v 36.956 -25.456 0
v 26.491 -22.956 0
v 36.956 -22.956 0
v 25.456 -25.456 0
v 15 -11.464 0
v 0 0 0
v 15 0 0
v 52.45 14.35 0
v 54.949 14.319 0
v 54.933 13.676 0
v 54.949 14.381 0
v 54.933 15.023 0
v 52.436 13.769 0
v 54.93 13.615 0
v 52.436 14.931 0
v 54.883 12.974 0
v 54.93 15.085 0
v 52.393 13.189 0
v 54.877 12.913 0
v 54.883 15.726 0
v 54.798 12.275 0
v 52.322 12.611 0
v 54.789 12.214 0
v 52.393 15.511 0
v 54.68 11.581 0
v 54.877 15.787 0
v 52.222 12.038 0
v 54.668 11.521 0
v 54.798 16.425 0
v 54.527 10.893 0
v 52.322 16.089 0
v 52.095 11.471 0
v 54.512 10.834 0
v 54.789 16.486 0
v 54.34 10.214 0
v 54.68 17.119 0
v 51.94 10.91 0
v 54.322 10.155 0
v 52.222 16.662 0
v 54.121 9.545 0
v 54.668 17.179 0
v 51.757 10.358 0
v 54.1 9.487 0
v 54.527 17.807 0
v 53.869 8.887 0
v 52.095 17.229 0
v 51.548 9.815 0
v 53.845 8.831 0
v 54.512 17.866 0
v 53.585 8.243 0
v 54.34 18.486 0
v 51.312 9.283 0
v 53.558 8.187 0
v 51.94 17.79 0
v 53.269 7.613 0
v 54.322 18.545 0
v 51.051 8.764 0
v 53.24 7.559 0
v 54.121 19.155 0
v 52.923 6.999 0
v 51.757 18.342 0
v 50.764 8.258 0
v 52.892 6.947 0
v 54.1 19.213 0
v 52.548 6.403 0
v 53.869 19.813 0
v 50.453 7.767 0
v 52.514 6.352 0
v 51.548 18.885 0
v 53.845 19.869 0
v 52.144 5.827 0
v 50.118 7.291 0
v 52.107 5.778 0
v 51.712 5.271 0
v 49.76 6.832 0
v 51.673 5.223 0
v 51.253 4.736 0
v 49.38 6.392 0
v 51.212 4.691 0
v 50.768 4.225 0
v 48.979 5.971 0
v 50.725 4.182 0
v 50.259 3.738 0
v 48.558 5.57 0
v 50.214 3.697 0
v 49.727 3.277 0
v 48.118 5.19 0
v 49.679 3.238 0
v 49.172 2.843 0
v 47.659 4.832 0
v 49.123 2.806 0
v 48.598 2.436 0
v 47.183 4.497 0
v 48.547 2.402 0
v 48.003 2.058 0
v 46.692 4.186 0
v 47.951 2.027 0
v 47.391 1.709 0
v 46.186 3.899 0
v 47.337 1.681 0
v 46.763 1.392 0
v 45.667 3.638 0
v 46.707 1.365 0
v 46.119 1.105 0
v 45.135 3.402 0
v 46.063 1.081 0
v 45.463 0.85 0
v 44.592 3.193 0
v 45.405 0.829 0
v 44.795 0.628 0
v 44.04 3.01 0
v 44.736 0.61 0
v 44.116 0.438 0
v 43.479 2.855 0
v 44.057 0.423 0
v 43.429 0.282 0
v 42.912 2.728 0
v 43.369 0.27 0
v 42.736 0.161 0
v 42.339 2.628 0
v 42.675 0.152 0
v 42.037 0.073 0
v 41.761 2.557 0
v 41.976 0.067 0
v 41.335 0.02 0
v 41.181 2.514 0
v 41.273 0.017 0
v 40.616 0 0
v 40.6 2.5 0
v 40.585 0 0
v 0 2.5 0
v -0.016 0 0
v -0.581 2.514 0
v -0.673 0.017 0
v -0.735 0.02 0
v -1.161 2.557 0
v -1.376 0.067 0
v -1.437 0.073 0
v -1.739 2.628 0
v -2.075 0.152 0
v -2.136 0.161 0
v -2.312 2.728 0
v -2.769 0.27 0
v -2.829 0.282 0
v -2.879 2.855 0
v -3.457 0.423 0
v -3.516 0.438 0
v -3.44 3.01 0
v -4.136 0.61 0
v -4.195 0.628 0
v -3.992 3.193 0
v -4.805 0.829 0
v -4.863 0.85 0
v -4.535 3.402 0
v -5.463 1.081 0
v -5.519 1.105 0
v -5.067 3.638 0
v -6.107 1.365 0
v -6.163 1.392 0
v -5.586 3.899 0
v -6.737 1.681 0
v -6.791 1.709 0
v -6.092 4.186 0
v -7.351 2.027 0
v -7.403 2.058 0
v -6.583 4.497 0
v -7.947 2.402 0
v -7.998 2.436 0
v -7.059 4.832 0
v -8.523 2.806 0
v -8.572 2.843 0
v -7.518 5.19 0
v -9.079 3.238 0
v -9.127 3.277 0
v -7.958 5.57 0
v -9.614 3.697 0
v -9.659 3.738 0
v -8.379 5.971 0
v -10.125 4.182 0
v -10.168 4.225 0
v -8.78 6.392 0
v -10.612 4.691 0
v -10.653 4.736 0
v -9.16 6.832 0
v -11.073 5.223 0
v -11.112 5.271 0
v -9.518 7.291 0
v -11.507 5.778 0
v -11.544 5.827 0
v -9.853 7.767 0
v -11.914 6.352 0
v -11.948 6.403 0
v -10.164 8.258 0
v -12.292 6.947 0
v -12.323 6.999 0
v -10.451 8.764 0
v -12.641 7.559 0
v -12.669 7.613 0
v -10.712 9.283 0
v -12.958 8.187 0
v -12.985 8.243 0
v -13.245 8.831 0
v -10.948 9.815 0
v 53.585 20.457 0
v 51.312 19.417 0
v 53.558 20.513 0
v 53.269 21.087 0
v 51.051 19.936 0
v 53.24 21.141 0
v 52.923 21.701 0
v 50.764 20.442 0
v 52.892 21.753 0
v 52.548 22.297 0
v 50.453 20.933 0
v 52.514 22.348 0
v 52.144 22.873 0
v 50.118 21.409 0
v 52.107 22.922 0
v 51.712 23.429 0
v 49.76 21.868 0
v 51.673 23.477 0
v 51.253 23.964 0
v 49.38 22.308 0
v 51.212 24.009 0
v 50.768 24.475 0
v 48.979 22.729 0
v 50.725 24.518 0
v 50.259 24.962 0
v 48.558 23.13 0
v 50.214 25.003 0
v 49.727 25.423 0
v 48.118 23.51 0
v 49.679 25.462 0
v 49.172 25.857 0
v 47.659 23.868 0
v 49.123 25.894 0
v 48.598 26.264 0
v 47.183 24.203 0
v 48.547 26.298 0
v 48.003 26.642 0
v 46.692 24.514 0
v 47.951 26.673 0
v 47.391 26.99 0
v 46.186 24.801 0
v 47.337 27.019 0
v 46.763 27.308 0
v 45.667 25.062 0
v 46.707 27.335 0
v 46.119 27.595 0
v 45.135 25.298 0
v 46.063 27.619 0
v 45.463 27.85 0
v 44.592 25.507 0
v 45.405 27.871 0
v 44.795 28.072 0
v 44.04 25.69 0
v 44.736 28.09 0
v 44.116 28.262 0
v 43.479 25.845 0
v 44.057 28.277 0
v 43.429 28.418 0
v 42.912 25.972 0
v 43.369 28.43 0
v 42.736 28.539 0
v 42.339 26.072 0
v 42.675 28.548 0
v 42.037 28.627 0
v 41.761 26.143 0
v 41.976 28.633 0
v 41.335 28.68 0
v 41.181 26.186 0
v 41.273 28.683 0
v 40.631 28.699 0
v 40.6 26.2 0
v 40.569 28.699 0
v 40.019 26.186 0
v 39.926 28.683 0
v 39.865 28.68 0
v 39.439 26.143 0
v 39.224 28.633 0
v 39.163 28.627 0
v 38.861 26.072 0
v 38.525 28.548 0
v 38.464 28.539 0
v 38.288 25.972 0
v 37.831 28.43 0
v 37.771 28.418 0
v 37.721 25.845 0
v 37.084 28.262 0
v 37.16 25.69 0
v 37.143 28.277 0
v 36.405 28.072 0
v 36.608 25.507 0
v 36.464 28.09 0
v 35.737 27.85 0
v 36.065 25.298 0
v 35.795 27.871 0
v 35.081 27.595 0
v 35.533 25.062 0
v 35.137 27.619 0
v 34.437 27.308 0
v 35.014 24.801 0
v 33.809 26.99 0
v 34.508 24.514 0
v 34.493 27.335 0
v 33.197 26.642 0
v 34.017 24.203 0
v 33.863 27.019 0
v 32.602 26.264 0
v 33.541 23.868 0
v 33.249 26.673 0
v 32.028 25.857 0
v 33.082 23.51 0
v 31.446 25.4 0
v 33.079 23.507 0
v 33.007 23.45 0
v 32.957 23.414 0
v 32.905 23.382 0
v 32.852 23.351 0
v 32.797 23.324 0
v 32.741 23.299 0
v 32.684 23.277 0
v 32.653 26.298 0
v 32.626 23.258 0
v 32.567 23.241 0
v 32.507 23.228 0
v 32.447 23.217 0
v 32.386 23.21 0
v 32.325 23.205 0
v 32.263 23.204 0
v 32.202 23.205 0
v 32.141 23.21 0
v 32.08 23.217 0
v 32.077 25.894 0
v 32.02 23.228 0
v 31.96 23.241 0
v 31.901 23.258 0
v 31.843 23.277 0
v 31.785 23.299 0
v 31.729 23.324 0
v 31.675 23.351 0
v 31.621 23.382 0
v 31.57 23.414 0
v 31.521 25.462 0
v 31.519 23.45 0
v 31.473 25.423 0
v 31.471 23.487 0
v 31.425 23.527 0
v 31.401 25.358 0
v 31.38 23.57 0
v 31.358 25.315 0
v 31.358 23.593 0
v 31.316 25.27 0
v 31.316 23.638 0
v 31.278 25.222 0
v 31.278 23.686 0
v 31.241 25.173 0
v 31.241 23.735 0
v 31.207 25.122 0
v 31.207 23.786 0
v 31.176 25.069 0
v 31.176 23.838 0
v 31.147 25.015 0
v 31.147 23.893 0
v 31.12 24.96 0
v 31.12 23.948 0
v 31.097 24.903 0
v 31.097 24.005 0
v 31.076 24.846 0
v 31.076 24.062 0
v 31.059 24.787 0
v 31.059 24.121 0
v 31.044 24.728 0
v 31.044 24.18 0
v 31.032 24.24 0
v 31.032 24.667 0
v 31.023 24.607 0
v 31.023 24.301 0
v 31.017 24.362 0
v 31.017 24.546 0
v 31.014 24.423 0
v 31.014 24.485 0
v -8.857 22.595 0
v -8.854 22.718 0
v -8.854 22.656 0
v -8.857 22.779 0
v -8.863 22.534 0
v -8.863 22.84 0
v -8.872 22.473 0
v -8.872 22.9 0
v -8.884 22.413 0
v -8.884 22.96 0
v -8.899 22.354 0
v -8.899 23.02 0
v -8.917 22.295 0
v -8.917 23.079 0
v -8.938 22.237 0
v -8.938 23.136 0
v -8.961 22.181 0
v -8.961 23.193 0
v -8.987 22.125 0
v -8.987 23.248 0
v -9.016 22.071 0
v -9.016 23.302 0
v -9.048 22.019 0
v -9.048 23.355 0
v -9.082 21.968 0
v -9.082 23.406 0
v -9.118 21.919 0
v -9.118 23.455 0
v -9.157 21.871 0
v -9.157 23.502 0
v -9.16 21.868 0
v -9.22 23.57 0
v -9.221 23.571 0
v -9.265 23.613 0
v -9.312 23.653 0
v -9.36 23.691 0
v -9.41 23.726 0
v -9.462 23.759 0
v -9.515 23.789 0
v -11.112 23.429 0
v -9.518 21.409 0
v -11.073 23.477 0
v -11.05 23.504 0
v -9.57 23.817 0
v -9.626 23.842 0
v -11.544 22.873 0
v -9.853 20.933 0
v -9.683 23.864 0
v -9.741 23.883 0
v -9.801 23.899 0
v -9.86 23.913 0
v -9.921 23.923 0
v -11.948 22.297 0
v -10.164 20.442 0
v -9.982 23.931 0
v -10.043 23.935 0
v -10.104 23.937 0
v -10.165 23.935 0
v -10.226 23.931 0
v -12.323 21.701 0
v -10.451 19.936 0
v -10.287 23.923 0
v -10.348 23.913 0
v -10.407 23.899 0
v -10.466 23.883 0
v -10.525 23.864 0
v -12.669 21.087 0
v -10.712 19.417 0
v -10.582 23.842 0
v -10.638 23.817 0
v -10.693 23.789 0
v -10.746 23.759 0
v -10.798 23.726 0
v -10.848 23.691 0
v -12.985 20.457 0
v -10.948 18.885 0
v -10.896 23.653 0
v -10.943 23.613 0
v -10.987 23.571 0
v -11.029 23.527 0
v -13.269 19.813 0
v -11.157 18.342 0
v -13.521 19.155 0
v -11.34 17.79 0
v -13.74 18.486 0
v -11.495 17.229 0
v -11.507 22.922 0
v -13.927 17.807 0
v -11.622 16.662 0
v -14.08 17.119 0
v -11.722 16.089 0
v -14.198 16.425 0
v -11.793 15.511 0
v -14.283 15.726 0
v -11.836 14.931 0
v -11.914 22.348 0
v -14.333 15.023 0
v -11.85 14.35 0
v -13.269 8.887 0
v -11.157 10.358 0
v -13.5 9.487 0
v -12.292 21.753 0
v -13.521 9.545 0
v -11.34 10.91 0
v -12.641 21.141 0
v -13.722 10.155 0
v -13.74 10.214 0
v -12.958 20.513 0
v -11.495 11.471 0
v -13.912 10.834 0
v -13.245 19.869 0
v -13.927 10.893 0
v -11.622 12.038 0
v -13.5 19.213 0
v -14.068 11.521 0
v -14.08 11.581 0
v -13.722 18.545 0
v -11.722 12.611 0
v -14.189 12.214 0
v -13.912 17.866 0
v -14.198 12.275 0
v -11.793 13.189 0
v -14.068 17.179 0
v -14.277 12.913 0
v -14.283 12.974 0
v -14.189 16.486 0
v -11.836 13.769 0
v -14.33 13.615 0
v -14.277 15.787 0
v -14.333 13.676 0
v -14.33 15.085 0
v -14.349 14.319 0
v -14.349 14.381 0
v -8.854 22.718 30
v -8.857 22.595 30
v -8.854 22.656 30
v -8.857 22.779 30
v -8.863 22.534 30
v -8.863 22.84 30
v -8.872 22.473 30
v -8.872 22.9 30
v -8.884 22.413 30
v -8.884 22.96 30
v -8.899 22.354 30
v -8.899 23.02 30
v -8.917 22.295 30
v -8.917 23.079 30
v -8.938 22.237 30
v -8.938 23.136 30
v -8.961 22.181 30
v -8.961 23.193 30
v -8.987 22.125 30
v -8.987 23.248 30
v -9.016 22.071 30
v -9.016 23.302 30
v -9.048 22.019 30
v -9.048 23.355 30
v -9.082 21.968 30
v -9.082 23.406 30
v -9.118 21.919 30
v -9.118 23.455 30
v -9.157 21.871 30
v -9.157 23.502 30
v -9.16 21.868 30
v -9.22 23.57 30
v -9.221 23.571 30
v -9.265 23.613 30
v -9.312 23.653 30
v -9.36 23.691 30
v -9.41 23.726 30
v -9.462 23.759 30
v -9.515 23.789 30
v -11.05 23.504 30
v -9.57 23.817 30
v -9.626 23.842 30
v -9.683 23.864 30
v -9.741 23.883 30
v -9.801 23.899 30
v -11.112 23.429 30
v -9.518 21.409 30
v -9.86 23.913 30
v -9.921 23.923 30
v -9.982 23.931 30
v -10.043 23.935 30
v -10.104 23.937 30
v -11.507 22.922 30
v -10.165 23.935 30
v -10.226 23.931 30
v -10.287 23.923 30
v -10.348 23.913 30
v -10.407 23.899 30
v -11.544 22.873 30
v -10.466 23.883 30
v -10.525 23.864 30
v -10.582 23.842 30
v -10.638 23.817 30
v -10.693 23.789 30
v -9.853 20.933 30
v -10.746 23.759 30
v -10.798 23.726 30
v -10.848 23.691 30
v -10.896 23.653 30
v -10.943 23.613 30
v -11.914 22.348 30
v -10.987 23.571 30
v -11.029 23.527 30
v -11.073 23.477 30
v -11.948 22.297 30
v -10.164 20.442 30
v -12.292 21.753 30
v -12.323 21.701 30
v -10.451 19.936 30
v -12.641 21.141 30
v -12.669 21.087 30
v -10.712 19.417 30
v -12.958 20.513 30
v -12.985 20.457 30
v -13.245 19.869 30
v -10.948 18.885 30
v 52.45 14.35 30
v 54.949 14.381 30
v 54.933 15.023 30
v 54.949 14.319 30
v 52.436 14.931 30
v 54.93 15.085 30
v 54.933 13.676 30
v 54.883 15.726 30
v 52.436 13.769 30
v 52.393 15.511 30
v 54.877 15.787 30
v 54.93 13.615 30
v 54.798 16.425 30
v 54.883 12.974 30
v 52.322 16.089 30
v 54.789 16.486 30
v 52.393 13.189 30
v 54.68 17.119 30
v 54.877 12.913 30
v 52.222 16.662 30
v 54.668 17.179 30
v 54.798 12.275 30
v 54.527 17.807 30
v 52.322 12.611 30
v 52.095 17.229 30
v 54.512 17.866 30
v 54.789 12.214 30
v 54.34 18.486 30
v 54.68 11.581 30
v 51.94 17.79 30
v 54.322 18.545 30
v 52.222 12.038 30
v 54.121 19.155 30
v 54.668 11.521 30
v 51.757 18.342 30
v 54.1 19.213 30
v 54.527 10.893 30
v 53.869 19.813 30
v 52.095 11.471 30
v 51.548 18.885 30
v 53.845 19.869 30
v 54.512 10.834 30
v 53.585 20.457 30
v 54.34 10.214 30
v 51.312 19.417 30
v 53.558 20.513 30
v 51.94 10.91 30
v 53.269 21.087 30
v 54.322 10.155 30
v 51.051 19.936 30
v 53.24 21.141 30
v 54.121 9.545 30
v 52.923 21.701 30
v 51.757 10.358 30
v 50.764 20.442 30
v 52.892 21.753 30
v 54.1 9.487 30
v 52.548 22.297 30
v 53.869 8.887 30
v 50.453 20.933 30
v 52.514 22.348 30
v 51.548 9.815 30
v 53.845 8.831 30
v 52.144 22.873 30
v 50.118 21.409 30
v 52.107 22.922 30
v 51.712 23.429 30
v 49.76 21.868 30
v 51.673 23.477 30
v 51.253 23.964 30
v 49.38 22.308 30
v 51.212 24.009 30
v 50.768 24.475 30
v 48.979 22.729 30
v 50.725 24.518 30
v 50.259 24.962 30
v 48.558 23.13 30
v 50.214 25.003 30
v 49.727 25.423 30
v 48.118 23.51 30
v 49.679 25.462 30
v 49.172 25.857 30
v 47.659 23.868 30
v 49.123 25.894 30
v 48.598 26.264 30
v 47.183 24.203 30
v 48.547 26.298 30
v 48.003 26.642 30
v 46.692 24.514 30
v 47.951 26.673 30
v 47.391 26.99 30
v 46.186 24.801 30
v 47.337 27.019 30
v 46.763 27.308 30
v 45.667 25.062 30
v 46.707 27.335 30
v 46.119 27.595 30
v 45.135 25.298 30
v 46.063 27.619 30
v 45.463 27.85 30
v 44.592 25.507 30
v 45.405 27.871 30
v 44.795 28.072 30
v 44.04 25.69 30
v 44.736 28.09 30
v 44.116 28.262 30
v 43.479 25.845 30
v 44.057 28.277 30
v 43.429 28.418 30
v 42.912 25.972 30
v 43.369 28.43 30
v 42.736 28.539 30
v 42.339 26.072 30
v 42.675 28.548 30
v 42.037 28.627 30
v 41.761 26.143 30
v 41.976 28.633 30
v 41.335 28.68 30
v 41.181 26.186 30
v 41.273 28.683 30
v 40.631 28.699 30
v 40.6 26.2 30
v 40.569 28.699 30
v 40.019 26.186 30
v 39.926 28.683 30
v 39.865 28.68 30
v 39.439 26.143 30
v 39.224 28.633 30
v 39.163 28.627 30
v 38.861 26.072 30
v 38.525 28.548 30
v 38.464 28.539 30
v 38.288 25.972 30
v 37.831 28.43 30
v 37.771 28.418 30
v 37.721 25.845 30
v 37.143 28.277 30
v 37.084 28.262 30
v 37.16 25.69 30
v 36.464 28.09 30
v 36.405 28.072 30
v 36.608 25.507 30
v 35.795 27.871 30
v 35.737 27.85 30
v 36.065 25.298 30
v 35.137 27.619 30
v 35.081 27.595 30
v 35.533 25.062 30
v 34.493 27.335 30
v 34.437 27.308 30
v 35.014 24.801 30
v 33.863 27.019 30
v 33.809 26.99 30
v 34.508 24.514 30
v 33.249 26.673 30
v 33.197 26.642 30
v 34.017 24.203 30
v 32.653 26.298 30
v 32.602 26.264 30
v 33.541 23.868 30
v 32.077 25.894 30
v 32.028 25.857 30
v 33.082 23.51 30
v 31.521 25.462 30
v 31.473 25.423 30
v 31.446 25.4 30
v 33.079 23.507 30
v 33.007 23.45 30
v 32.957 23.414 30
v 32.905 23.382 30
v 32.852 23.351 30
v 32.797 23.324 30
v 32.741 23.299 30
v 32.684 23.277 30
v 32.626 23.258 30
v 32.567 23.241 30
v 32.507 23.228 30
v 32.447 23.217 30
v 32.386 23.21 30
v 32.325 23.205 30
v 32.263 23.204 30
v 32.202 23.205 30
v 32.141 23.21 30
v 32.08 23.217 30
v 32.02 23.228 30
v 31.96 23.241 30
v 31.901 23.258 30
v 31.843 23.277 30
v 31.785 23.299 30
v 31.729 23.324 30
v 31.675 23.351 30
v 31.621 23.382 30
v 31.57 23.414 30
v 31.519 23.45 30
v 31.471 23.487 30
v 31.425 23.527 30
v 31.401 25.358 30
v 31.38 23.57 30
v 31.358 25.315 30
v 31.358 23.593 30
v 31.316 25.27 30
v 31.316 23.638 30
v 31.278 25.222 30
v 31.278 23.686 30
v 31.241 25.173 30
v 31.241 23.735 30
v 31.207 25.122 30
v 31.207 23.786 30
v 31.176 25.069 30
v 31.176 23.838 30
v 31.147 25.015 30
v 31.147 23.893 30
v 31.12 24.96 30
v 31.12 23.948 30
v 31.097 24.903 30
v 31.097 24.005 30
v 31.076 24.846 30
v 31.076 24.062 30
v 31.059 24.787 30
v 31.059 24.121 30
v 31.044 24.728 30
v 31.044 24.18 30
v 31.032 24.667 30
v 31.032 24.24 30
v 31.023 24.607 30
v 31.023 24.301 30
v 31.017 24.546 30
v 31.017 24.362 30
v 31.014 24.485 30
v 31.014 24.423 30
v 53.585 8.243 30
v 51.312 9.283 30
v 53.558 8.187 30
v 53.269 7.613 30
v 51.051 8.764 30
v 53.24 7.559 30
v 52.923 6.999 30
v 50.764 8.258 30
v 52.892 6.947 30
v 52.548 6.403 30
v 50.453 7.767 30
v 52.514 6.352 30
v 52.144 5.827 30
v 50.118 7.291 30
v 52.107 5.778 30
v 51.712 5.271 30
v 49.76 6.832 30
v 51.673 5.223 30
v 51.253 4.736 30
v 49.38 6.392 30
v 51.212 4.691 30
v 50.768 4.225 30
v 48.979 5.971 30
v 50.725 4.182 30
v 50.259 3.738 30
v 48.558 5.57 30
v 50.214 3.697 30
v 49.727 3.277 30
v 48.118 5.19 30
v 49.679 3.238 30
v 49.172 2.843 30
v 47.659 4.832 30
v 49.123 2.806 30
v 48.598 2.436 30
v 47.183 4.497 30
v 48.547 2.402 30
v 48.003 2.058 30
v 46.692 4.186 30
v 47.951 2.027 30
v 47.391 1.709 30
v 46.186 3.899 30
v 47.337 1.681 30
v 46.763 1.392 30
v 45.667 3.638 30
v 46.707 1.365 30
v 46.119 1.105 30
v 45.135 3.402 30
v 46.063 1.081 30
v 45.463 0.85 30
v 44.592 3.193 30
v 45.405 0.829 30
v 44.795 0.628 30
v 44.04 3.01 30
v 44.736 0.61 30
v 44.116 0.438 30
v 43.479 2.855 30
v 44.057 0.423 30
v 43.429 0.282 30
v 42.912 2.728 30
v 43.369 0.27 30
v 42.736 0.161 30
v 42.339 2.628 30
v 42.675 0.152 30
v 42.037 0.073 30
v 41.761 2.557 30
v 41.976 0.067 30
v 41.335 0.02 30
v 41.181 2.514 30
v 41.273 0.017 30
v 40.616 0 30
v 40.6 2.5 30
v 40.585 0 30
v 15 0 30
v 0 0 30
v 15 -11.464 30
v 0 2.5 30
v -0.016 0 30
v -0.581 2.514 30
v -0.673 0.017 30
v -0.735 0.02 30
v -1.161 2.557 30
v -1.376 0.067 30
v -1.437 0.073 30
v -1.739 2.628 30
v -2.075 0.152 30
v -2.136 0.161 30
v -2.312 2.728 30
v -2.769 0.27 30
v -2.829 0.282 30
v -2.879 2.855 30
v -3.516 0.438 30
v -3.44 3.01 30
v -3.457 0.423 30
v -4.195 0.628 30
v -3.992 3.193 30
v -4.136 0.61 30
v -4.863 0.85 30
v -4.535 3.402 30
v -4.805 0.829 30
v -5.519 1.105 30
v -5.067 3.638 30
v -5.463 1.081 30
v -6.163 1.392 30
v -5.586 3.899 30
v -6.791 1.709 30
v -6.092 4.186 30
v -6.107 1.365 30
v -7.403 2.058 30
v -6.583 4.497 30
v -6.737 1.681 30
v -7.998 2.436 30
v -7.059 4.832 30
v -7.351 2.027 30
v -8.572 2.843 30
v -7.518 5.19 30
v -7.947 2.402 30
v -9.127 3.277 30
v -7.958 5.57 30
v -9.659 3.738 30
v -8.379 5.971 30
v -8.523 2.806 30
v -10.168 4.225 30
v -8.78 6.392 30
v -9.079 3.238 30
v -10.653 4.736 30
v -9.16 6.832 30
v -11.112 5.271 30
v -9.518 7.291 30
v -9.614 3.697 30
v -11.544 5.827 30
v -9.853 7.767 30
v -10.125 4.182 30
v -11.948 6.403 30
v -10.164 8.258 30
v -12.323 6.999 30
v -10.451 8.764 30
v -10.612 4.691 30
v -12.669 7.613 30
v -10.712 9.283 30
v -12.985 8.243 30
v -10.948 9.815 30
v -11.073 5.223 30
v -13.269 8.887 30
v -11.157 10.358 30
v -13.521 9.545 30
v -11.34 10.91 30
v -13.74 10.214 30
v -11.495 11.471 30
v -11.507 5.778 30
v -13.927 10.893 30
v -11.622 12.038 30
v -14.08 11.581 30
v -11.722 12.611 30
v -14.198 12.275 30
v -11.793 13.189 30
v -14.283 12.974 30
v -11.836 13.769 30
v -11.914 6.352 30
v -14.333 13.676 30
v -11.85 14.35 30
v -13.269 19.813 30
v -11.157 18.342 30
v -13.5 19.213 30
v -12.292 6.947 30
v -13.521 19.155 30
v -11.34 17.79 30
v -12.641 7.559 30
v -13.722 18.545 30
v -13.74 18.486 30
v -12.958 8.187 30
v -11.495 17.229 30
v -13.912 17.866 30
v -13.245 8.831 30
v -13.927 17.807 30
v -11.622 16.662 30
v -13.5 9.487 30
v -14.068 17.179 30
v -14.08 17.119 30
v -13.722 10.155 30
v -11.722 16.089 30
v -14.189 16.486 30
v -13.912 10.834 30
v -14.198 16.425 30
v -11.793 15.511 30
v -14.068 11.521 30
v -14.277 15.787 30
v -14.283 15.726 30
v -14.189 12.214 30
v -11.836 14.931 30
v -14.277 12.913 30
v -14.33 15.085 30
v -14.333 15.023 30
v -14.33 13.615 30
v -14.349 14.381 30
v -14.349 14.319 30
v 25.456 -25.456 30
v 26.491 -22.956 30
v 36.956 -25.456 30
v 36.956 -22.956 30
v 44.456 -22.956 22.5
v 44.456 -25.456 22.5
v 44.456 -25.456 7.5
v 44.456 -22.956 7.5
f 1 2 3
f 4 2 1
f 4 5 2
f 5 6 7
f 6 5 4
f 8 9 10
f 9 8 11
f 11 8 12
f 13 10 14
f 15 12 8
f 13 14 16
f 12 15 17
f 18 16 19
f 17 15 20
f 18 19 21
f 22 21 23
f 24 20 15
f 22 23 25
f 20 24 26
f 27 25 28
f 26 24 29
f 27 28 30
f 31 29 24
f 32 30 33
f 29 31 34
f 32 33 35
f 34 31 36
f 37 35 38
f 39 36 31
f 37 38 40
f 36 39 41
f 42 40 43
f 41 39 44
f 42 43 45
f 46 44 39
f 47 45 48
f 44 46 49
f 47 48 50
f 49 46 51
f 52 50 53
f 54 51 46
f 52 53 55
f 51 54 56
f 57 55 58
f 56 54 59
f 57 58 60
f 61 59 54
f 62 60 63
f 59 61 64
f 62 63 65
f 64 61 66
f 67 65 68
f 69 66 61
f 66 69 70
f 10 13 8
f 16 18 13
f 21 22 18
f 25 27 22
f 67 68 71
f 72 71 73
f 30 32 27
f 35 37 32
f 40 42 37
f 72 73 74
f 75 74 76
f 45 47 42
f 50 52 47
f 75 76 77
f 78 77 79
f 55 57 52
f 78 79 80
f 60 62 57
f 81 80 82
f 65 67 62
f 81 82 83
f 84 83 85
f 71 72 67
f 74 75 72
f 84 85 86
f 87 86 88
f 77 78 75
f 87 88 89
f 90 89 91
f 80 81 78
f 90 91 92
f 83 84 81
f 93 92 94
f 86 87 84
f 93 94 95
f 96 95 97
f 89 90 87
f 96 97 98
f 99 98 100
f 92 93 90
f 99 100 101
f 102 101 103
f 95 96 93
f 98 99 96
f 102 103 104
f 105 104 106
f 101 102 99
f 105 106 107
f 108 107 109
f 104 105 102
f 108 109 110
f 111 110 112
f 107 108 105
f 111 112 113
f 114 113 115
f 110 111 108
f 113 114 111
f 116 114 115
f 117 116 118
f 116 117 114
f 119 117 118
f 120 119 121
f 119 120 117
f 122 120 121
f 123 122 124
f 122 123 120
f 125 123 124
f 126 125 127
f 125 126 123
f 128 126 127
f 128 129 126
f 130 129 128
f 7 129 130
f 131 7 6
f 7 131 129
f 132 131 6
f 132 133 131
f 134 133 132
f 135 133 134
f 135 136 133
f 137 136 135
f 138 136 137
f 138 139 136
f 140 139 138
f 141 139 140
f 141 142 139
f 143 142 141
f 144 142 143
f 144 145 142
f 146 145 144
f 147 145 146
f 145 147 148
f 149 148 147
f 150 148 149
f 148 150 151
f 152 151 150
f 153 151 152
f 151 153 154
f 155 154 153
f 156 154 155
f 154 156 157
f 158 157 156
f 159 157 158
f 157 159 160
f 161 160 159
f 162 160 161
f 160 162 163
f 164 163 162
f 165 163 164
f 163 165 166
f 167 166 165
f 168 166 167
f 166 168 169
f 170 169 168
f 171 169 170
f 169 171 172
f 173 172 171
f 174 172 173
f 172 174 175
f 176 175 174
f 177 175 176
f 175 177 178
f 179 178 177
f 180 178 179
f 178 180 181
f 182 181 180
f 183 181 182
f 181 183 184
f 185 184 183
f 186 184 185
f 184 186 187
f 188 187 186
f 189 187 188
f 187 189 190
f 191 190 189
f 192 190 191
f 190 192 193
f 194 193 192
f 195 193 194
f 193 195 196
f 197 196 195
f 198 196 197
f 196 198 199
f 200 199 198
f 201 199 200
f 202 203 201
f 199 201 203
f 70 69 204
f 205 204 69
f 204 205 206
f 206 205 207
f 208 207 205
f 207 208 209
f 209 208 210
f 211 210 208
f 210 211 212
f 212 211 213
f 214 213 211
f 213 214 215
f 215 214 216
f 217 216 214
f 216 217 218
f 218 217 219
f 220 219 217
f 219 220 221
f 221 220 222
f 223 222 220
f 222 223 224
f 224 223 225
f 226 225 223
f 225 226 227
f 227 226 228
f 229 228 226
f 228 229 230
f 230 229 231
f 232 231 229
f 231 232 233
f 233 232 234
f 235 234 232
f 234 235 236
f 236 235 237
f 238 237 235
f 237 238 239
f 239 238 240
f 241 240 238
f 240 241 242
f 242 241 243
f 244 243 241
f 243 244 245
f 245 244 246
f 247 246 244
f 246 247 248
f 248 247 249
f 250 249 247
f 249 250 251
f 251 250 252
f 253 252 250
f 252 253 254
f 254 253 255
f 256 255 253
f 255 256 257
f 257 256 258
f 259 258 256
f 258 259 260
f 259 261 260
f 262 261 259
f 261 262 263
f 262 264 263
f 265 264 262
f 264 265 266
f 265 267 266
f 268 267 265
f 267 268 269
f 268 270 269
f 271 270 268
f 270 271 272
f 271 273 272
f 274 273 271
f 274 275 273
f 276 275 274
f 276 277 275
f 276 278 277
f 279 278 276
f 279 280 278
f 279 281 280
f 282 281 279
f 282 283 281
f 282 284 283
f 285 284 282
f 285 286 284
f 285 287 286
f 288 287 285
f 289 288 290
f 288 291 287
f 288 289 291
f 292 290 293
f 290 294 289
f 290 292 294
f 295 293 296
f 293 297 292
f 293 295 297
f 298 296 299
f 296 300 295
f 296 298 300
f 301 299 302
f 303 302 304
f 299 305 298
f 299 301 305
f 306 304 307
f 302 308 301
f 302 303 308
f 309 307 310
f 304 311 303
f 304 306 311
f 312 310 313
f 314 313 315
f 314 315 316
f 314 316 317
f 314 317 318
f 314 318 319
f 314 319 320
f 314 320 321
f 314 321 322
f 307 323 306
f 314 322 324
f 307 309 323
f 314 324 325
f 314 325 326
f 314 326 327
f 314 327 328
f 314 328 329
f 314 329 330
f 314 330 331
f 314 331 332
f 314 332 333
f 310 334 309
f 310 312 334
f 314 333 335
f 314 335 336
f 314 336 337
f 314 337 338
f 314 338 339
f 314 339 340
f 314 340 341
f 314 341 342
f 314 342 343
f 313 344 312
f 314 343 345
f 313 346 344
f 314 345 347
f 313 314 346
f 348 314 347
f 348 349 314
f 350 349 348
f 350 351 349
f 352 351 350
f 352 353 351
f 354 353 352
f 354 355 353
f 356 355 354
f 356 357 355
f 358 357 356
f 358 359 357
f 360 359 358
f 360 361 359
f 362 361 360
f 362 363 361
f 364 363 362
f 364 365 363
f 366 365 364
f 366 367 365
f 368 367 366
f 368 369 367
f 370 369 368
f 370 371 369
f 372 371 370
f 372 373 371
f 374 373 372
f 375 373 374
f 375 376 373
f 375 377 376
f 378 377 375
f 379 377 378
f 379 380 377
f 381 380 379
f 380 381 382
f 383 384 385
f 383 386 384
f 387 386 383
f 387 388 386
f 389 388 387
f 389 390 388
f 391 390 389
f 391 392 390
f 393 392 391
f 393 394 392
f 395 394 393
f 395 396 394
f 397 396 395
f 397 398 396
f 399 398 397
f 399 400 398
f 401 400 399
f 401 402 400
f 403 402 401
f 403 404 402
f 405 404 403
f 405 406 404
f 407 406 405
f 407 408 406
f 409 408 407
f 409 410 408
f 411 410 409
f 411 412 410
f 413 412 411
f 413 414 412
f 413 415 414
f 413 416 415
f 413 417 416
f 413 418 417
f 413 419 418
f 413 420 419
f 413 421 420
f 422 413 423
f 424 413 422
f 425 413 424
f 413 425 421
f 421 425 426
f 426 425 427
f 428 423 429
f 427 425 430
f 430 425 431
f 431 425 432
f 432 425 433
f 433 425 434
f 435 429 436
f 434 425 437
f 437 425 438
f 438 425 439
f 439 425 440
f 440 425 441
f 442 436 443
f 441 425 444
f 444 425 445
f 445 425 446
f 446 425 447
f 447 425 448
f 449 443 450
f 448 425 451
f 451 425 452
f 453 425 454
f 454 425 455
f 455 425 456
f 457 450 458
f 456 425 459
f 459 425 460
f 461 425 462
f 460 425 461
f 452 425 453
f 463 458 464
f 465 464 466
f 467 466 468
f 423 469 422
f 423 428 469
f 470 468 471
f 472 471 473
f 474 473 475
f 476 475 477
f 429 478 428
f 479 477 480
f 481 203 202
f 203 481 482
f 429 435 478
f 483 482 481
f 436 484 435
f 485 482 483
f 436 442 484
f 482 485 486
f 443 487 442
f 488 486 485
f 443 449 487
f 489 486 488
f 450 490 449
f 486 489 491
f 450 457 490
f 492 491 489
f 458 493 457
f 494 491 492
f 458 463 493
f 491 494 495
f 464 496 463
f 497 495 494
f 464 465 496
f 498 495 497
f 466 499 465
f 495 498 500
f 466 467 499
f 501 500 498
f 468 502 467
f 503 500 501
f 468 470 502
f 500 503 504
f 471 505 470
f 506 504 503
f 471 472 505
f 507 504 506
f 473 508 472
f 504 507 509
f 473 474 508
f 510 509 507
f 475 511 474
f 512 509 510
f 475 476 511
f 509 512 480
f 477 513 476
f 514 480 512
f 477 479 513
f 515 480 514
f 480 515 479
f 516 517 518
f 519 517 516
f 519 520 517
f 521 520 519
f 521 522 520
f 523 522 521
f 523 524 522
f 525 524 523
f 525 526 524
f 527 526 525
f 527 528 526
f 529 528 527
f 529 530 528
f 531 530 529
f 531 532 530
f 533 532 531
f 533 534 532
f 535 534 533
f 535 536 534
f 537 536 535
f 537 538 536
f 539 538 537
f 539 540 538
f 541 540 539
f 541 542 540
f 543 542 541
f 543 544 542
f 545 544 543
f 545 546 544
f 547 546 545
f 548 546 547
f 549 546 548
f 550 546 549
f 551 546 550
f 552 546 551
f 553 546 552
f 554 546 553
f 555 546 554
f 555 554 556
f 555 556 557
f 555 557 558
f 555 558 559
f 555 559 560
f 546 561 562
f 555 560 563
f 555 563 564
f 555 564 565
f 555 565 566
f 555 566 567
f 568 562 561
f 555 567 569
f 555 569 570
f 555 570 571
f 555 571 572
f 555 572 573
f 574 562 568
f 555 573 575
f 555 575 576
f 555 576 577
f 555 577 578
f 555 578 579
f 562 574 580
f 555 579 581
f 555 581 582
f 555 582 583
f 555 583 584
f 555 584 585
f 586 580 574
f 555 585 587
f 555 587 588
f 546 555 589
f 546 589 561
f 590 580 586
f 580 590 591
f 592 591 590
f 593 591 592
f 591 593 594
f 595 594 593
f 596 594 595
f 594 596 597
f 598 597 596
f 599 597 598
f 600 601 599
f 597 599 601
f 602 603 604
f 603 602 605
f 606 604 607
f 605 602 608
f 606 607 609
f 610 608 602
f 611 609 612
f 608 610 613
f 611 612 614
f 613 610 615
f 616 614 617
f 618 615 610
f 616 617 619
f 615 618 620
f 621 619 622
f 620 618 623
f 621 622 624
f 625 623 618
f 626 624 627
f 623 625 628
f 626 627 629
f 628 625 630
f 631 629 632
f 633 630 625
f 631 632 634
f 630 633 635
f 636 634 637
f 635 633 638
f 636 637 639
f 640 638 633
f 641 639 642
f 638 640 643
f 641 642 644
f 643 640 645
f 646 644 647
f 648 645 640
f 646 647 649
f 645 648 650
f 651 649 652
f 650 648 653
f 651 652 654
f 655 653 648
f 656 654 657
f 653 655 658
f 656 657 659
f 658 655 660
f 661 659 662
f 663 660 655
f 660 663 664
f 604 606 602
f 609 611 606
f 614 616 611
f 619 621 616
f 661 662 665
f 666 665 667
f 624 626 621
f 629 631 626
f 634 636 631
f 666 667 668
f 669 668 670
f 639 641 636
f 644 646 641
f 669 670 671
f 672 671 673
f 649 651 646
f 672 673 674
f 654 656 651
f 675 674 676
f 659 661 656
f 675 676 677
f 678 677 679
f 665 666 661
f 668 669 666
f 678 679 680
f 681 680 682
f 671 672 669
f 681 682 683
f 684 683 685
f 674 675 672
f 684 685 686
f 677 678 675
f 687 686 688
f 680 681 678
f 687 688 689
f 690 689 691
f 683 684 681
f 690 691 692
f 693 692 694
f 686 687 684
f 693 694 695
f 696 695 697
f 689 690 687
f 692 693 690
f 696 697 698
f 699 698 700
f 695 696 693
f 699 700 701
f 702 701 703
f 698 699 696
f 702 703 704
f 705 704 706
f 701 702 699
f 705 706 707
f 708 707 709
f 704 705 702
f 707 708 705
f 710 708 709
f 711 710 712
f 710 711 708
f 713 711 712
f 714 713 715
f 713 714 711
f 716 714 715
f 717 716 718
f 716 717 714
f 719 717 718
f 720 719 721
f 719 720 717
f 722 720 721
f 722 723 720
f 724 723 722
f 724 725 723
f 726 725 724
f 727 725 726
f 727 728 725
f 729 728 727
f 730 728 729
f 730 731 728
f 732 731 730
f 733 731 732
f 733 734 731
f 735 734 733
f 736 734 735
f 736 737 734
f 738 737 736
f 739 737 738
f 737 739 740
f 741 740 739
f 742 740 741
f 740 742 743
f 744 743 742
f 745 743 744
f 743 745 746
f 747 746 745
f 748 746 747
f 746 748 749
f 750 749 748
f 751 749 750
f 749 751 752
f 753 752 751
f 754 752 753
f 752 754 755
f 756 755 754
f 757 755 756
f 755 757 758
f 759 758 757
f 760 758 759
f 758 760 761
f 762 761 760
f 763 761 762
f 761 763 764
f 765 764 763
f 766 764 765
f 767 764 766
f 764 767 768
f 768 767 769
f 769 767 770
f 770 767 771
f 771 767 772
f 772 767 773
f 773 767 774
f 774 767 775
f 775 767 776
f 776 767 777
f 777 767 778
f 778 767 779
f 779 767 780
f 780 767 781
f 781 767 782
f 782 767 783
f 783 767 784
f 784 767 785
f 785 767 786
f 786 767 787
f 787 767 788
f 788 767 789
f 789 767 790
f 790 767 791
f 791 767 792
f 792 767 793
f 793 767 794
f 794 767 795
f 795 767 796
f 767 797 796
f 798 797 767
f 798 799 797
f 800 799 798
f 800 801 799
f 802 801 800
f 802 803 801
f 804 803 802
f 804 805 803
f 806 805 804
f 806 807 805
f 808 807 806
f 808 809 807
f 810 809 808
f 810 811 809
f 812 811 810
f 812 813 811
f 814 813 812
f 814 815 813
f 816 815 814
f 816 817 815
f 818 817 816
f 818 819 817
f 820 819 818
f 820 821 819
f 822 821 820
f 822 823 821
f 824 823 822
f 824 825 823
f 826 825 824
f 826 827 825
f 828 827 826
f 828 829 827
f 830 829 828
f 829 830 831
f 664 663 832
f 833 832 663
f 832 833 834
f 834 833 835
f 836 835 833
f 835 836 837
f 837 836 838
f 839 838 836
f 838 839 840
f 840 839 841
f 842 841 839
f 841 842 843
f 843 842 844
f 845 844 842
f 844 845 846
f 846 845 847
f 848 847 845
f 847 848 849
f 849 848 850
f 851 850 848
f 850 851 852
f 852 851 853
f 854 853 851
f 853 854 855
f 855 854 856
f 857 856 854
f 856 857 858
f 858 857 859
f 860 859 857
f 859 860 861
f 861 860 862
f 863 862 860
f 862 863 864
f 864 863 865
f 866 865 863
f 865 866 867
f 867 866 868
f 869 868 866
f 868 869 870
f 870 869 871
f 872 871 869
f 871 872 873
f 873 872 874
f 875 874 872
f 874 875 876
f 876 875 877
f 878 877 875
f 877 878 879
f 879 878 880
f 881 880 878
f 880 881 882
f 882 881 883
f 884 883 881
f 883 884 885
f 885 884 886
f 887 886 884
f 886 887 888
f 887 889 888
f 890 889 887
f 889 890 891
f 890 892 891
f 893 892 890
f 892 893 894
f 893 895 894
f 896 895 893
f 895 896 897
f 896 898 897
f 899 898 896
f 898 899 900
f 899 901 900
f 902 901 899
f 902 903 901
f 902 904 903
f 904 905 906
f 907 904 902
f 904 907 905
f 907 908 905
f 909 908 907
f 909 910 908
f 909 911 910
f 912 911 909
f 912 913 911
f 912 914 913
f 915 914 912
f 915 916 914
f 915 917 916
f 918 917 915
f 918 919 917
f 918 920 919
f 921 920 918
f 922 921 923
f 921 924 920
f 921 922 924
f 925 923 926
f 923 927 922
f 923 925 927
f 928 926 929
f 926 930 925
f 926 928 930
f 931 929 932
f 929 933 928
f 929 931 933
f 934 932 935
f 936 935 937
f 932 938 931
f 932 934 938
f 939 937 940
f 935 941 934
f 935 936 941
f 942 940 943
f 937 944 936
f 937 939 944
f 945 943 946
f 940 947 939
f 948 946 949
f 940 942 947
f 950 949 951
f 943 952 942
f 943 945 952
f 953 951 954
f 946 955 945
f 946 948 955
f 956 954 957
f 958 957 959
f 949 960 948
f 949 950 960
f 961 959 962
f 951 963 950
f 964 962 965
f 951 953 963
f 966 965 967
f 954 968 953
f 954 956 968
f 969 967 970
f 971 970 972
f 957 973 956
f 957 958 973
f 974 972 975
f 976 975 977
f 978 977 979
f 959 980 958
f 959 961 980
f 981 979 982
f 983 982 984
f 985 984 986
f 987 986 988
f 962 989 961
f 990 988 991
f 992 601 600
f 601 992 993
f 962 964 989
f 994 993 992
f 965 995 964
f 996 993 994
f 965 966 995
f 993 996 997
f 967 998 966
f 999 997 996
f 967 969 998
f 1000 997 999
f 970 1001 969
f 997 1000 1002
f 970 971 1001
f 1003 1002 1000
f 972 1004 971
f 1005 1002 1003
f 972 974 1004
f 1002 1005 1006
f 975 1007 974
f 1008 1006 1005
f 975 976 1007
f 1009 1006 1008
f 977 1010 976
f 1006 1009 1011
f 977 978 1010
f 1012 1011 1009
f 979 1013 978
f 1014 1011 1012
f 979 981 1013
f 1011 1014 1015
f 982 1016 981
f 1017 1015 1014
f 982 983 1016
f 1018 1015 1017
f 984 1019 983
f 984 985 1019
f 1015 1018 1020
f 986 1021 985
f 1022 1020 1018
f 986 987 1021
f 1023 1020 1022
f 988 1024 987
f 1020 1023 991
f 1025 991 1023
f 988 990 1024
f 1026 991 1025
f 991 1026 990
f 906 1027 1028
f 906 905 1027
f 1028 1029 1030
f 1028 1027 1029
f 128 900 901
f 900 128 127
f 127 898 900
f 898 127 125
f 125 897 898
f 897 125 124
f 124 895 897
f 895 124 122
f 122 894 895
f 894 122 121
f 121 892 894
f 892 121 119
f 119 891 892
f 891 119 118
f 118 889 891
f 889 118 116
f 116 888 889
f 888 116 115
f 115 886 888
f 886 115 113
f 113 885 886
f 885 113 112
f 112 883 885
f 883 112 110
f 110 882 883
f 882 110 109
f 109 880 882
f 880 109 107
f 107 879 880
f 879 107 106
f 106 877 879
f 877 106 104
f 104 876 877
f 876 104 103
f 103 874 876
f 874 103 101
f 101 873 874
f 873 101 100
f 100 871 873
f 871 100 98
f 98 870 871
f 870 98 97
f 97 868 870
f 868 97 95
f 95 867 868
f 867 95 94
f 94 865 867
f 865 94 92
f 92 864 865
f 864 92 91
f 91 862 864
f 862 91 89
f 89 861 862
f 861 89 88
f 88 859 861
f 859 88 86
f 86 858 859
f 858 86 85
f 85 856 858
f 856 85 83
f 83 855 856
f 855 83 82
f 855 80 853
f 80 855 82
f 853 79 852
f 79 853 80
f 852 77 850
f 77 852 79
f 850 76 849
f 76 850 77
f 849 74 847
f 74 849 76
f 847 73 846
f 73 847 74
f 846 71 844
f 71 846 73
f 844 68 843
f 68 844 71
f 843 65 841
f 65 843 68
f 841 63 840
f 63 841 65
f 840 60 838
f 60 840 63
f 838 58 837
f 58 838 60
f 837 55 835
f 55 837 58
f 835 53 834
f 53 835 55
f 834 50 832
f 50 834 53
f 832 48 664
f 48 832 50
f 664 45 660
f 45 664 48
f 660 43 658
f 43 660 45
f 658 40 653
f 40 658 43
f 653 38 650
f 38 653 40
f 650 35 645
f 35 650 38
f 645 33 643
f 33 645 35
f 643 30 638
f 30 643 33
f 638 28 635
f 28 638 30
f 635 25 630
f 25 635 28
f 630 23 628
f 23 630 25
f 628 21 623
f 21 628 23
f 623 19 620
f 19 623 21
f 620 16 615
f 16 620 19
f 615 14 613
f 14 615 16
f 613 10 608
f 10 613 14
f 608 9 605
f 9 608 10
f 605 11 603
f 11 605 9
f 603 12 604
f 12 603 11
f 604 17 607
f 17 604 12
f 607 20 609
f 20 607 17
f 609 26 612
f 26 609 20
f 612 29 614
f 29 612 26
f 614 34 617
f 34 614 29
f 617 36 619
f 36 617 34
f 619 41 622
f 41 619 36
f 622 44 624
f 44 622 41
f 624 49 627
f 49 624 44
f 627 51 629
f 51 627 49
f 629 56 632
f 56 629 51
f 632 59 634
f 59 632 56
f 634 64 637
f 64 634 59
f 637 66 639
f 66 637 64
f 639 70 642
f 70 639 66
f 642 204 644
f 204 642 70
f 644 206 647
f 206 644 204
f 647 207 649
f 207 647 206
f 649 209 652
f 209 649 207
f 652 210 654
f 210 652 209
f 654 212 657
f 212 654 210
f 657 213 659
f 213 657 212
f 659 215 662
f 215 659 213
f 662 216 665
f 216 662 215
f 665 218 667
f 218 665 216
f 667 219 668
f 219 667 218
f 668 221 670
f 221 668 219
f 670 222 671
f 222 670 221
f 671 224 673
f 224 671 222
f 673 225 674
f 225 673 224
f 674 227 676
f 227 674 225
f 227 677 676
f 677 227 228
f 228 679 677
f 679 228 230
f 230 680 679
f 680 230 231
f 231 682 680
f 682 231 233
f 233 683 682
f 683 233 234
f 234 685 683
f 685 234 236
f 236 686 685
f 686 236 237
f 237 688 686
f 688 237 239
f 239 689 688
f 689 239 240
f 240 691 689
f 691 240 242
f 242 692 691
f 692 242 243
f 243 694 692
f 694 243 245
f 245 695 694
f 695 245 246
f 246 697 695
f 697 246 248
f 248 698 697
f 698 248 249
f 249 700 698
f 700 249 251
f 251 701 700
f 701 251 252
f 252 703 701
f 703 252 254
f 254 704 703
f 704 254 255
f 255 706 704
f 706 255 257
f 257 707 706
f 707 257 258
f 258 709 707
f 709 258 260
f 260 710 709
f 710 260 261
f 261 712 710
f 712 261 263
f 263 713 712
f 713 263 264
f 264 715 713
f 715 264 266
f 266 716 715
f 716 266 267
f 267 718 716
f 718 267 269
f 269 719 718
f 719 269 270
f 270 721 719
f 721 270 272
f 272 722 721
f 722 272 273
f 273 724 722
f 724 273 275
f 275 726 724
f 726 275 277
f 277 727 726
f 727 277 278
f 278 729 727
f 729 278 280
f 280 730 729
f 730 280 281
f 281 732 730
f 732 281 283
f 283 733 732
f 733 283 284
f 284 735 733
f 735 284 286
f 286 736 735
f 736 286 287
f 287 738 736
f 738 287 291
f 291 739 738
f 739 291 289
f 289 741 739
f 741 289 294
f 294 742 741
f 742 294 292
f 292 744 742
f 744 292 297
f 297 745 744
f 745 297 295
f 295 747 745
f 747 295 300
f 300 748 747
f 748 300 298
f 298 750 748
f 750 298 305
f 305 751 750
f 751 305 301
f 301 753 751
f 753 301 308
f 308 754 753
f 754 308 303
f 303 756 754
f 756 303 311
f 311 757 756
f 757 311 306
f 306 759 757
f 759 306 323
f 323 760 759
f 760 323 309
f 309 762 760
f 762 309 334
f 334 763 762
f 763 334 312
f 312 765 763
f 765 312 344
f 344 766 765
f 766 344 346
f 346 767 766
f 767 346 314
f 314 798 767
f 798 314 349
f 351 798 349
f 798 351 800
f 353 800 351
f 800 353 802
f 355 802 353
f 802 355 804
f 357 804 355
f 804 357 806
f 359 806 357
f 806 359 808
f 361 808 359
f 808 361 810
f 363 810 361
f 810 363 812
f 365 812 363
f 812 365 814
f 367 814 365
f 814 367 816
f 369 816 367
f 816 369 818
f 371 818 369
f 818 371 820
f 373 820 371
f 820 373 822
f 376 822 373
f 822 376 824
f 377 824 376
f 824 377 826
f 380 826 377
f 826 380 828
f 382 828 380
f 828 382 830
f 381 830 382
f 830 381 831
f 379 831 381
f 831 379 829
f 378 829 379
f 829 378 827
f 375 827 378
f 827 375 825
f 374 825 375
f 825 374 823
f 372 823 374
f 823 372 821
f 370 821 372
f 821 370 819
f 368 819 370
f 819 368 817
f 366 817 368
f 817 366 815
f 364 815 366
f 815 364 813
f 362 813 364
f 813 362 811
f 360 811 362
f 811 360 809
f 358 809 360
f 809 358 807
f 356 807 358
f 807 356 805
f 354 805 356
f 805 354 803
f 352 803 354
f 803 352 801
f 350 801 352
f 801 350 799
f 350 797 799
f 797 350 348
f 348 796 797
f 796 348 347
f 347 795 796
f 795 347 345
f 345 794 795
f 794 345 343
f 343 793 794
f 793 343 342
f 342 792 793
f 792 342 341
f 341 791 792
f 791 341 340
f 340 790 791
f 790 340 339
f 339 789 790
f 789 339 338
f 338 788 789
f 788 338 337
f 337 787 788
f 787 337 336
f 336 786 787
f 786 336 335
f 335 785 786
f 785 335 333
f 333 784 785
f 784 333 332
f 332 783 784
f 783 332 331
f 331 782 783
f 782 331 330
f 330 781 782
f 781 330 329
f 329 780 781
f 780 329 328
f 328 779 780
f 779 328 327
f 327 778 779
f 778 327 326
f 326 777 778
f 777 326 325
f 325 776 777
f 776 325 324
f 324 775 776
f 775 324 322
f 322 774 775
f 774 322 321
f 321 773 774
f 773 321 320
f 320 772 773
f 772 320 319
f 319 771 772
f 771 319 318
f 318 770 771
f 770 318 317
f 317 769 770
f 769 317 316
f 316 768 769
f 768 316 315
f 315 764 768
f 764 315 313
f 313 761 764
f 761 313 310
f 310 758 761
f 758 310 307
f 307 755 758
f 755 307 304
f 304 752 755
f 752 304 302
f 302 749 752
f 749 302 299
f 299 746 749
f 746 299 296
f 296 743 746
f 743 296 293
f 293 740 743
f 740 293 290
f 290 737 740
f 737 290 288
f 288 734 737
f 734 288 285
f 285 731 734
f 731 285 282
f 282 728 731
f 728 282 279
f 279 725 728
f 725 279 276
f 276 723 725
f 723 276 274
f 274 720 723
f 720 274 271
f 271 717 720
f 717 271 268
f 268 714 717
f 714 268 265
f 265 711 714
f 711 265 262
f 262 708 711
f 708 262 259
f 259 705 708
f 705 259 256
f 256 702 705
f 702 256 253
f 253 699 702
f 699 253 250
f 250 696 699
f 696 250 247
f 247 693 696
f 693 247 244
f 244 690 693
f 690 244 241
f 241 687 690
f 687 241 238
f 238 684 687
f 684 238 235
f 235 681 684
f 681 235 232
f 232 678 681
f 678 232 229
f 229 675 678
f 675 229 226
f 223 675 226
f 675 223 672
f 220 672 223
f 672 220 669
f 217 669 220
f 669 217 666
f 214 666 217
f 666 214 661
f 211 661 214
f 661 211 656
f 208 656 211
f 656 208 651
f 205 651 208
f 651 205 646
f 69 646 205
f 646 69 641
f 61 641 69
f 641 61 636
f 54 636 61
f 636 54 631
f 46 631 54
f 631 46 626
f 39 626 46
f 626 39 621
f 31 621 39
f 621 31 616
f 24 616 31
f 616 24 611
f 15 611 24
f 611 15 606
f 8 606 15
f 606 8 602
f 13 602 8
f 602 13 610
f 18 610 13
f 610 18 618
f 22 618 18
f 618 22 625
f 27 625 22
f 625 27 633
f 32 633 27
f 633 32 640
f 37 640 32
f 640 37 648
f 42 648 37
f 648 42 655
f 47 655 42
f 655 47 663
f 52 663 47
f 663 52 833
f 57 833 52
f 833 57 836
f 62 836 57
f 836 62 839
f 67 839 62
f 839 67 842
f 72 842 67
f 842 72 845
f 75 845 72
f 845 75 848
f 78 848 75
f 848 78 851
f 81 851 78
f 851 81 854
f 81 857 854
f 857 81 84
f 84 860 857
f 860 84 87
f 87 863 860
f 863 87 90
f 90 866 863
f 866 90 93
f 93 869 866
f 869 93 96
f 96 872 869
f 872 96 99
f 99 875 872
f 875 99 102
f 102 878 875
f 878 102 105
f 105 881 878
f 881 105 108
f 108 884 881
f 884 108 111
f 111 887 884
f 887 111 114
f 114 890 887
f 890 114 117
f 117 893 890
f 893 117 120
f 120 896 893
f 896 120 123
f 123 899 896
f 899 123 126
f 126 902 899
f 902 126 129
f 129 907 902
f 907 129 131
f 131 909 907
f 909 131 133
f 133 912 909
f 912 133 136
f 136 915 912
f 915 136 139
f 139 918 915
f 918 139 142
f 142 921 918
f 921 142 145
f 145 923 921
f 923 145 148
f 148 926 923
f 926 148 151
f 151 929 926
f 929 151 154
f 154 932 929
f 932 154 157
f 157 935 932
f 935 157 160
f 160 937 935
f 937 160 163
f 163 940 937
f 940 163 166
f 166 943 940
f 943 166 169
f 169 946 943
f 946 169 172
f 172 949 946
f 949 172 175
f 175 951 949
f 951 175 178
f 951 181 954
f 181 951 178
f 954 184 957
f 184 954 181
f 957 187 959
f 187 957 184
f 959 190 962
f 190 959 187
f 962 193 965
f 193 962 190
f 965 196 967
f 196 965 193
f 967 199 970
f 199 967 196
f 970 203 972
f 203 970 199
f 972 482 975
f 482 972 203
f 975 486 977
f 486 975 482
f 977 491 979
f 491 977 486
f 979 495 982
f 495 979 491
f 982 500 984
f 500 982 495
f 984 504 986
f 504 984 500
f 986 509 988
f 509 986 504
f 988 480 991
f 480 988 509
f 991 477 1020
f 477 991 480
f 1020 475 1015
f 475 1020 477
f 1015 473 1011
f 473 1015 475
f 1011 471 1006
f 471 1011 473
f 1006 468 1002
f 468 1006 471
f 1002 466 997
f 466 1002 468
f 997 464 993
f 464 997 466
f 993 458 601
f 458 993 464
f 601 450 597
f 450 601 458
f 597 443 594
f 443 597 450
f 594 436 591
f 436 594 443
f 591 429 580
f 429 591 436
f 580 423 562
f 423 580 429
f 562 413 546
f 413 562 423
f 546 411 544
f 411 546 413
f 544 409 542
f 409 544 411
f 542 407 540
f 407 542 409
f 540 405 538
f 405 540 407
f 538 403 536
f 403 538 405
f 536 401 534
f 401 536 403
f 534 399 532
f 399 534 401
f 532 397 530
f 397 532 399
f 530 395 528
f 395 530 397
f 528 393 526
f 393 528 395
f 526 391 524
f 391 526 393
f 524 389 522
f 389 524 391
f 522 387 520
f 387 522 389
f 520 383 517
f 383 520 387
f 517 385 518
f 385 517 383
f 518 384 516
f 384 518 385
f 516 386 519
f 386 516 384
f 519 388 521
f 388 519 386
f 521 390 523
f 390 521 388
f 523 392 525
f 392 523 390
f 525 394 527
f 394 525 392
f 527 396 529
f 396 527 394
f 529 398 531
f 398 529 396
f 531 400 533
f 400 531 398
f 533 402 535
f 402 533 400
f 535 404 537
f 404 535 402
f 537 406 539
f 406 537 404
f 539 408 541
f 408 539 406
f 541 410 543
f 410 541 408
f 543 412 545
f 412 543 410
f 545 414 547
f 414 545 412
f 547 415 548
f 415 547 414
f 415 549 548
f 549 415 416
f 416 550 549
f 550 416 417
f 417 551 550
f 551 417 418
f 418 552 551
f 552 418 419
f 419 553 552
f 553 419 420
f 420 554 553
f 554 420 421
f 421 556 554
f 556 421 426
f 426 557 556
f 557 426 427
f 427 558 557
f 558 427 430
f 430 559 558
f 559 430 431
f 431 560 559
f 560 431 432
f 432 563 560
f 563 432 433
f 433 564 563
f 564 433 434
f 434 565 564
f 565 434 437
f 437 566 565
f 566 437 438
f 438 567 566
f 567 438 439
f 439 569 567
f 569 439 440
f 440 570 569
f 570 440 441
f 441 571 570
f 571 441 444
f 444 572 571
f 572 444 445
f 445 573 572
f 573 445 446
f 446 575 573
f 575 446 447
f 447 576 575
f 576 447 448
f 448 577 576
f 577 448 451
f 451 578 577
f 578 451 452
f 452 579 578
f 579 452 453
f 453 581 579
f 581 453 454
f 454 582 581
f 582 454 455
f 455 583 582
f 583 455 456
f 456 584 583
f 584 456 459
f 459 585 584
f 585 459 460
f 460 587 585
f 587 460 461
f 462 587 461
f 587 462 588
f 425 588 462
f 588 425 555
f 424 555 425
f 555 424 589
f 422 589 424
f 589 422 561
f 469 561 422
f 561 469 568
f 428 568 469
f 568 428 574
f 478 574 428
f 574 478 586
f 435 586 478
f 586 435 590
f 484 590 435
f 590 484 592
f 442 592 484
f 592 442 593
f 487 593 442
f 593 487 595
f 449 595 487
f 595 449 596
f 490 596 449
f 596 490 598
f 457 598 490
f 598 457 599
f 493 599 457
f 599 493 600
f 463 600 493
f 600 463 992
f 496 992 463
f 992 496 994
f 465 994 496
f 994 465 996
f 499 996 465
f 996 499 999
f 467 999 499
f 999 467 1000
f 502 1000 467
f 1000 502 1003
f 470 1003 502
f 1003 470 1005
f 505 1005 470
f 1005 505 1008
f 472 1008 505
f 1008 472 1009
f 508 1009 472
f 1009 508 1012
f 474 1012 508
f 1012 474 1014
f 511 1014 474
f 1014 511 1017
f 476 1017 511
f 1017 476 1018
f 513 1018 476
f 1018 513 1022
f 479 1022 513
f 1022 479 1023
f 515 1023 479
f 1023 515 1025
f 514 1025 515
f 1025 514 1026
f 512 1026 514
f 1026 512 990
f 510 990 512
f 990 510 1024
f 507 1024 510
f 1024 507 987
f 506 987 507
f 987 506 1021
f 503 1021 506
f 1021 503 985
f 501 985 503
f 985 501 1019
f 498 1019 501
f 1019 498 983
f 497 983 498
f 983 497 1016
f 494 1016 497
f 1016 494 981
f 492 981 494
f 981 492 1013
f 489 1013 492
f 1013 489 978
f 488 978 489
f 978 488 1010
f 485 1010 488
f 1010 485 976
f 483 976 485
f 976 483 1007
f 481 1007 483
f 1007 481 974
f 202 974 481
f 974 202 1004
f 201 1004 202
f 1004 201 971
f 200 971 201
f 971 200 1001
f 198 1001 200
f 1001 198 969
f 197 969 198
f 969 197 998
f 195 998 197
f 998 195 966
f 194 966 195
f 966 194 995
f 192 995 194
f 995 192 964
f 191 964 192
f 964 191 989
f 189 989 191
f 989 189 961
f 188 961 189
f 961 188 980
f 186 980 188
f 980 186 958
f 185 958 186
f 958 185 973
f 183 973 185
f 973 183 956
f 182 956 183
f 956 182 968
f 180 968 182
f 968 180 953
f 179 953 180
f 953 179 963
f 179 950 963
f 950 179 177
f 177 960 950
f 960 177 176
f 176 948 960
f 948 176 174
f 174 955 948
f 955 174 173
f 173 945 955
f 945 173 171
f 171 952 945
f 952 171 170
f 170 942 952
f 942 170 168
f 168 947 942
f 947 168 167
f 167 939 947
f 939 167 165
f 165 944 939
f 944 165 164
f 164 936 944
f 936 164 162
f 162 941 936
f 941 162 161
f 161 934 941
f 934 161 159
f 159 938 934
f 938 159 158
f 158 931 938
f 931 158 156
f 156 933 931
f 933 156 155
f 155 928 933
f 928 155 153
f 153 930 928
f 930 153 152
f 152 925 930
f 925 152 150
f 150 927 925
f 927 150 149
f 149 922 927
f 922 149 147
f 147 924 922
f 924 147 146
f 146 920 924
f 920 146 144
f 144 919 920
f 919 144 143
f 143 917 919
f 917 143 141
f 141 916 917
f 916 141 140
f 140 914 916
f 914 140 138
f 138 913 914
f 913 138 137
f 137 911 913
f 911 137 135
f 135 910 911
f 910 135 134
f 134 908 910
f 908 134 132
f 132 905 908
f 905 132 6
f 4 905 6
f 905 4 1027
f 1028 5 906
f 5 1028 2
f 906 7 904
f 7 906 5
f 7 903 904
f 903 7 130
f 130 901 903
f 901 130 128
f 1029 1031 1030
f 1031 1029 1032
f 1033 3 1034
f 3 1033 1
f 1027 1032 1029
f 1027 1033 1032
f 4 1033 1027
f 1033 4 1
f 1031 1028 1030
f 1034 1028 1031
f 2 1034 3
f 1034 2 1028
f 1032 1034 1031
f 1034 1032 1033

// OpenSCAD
///////////////////////
// Native parameters //
///////////////////////
$fa = 0.1;
$fs = 0.1;
$fn=128;

//////////////////////
// Model parameters //
//////////////////////

barDiameter = 23.5;
barDistance=16.9;
barOffset = 0.2;

handlerWidth = 30;
handlerShape = "triangle";

wallSize = 2.5;
insideDiameter = barDiameter + barOffset;
outsideDiameter = insideDiameter + wallSize * 2;

structureTriange=15;
structureLength=36;
structureHeight=4;

///////////
// Tools //
///////////

module rounding2d(r) {
  offset(r = r) offset(delta = -r) children(0);
}

module circleHandler() {
  translate([0, outsideDiameter / 2, 0]) difference() {
    circle(d=outsideDiameter);
    circle(d=insideDiameter);
  }
}

module halfCircle(d) {
  difference() {
    circle(d=d);
    translate([0,-d/2]) square([d/2,d]);
  }
}

linear_extrude(handlerWidth) {
  rounding2d(0.999 * (wallSize / 2)) {
    union() {
      difference() {
        union() {
          circleHandler();
          translate([insideDiameter + barDistance, 0, 0]) circleHandler();
          square([insideDiameter + barDistance, wallSize]);
        }

        // Cut the closest circle
        translate([0, wallSize]) union() {
          translate([0,insideDiameter/2,0]) rotate(45) square([insideDiameter, outsideDiameter]);
          square([(insideDiameter/2)+wallSize, insideDiameter+wallSize]);
        }

        // Cut the second circle
        translate([barDistance,wallSize]) union() {
          translate([0, insideDiameter/2]) polygon([[0,0], [0, insideDiameter], [insideDiameter, 0]]);
          square([insideDiameter, insideDiameter/2]);
        }
      }
    }
  }

  // Handler diagonal
  polygon([[0,0], [structureTriange, -structureTriange], [structureTriange,0]]);
  rotate(45) translate([0, -1*(structureLength)]) square([wallSize, structureLength]);
}

// Handler shapes
if (handlerShape == "circle") {
  translate([structureHeight+structureLength/sqrt(2),-structureLength/sqrt(2)+wallSize,handlerWidth/2]) rotate([90,180,0]) linear_extrude(wallSize) union() {
    halfCircle(handlerWidth);
    translate([0,-handlerWidth/2,0]) square([structureHeight, handlerWidth]);
  }
}
if (handlerShape == "triangle") {
  translate([structureHeight+structureLength/sqrt(2),-structureLength/sqrt(2)+wallSize,handlerWidth/2]) rotate([90,180,0]) linear_extrude(wallSize) union() {
    handlerOffset = handlerWidth/4;
    translate([-handlerOffset,-handlerWidth/2]) polygon([[0,0], [0, handlerWidth],[-handlerWidth/4,3*handlerWidth/4],[-handlerWidth/4,0],[-handlerWidth/4,handlerWidth/4]]);
    translate([-handlerOffset,-handlerWidth/2]) square([structureHeight + handlerOffset, handlerWidth]);
  }
}
